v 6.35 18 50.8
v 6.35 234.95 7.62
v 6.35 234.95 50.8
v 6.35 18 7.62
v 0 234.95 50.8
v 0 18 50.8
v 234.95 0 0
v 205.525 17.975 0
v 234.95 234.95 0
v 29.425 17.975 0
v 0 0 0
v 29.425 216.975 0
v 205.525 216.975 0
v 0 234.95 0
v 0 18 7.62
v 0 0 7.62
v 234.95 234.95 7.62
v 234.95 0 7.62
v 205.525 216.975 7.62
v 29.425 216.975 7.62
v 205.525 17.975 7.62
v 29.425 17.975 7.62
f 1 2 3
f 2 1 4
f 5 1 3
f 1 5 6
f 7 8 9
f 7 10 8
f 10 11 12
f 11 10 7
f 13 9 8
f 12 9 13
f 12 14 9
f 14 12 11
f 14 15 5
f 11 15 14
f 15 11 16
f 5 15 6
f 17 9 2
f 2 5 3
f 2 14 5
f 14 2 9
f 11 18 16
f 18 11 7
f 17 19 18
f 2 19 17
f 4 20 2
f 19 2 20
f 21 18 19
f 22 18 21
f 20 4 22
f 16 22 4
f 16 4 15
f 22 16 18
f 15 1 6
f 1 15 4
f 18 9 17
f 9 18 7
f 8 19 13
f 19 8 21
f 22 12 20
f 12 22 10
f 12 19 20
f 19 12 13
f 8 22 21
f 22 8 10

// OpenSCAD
x=25.4*9.25;
y=25.4*9.25;
z=25.4*.3;
cutout_x=176.1;
cutout_y=199;
spill_bar_z=25.4*2;
spill_bar_x=25.4*.25;
spacer_y=18;

difference(){
    union(){
        cube([x,y,z]);
        
        difference(){
        cube([spill_bar_x,y,spill_bar_z]);
        
        translate([-1,0,z])
        color("blue")
        cube([spill_bar_x+2, spacer_y, spill_bar_z]);
        }
    }

    translate([(x-cutout_x)/2,(y-cutout_y)/2,-1])
    color("red")
    cube([cutout_x, cutout_y, z +2]);
}
